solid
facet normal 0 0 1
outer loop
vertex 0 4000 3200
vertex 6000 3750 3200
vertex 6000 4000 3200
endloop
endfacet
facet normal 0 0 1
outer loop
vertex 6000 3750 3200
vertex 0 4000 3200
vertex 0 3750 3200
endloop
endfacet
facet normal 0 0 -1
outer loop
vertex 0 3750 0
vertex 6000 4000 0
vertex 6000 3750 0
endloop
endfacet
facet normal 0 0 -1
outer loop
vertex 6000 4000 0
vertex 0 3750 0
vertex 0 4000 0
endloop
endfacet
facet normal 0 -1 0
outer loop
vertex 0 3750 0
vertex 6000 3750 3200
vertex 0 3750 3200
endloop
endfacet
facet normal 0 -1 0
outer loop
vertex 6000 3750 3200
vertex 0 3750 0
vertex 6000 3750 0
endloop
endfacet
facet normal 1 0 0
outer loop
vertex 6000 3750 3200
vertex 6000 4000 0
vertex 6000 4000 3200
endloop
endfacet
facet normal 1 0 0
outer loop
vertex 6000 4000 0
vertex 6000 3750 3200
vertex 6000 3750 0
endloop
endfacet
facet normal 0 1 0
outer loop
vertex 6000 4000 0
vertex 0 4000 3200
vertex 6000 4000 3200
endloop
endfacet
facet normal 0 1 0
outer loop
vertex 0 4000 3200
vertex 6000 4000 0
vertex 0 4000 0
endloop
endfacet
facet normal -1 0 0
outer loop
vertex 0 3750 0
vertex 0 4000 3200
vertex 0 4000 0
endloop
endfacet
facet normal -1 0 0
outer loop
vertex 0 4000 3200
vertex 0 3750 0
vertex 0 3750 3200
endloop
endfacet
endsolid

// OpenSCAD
// file: tea_shop_parameters.scad
// =============================================================================
// Tea Shop — SHARED PARAMETERS (Base & Shell)
// -----------------------------------------------------------------------------
// OpenSCAD's native unit is 1 mm, so every value here is the REAL-LIFE size
// in millimetres (1000 mm = 1 m). E.g. building_width = 6000 means 6.0 m.
//
// For MLO / FiveM (which uses metres as 1 unit = 1 m), either:
//   (a) export each STL here and re-import at a scale of 0.001 (mm -> m), or
//   (b) model in metres directly by dividing every value below by 1000.
//
// Tune each value here; every module pulls its size from these variables.
// =============================================================================


// --- building shell / roof (lean-to: TALL back, SHORT front eave) -----------
wall_thickness    = 250;   // wall panel thickness                      (0.25 m)
building_width    = 6000;  // X extent, left wall -> right wall          (6.00 m)
building_depth    = 4000;  // Y extent, front eave -> back wall          (4.00 m)
back_height       = 3200;  // full wall height at the BACK (tall side)   (3.20 m)
front_eave_height = 2400;  // wall height at the FRONT eave (short side) (2.40 m)

// --- front wall openings (service window + door), measured along X ----------
left_pier_width   = 600;   // solid pier left of the service window      (0.60 m)
window_width      = 3400;  // service window opening width — made WIDE   (3.40 m)
mid_pier_width    = 500;   // solid pier between window and door         (0.50 m)
door_width        = 1000;  // door opening width                         (1.00 m)
sill_height       = 900;   // knee-wall (sill) height beneath the window (0.90 m)

// --- base slab / plinth ------------------------------------------------------
base_thickness    = 200;   // vertical thickness of the ground plinth    (0.20 m)
base_side_margin  = 900;   // slab overhang beyond left/right walls      (0.90 m)
base_back_margin  = 600;   // slab overhang behind the back wall         (0.60 m)
base_front_margin = 3000;  // extra slab in FRONT = porch/patio (pergola)(3.00 m)


// -----------------------------------------------------------------------------
// DERIVED DIMENSIONS (do not edit — computed from the values above)
// -----------------------------------------------------------------------------

// front-wall pier chain, left -> right, must sum exactly to building_width
window_left      = left_pier_width;                    // X where the window starts
window_right     = window_left + window_width;         // X where the window ends
door_left        = window_right + mid_pier_width;      // X where the door starts
door_right       = door_left + door_width;             // X where the door ends
right_pier_width = building_width - door_right;        // fills the rest to the corner

// window opening rises from the top of the sill up to the front eave line
window_open_height = front_eave_height - sill_height;
// file: tea_shop_modules.scad
// =============================================================================
// Tea Shop — MODULE LIBRARY (Base & Shell)
// -----------------------------------------------------------------------------
// This file only DEFINES the parts (and the assemble() preview). It instantiates
// NO geometry on its own, so it can be include'd by the individual export files
// (part_*.scad) and by tea_shop_assemble.scad without producing duplicates.
//
// GLOBAL COORDINATE SYSTEM (shared by every piece — no per-part centering):
//   +X -> left -> right  (building WIDTH along X, left wall at X=0)
//   +Y -> front -> back  (building DEPTH along Y, front eave at Y=0)
//   +Z -> up             (ground/porch surface = Z=0)
//
//   Building footprint = [0..building_width] x [0..building_depth].
//   Roof = single-pitch lean-to: TALL at BACK (Y=depth), SHORT at FRONT (Y=0).
// =============================================================================

include <tea_shop_parameters.scad>;


// -----------------------------------------------------------------------------
// _trapezoid_prism — shared core for the two side walls. It draws the side
// elevation (depth x height) as a 2D polygon, then linear_extrude +
// rotate([0,-90,0]) stand it up so its thickness runs along X. The front edge
// (Y=0) is the short eave height and the back edge (Y=depth) is the full back
// height, so the top edge automatically matches the roof pitch. Result
// occupies X = [0 .. wall_thickness].
// -----------------------------------------------------------------------------
module _trapezoid_prism() {
    translate([wall_thickness, 0, 0])
        rotate([0, -90, 0])
            linear_extrude(height = wall_thickness)
                polygon(points = [
                    [0,                 0],               // front, ground
                    [0,                 building_depth],  // back,  ground
                    [back_height,       building_depth],  // back,  top (tall)
                    [front_eave_height, 0]                // front, top (eave)
                ]);
}


// =============================================================================
// base_slab — flat ground plinth. Extends past the building on all sides, with
// a generous margin up front to form the porch/patio where the bench / stools
// sit under the pergola. Top surface is the datum Z=0.
// =============================================================================
module base_slab() {
    translate([-base_side_margin, -base_front_margin, -base_thickness])
        cube([
            building_width + 2 * base_side_margin,                 // X
            building_depth + base_front_margin + base_back_margin, // Y
            base_thickness                                          // Z
        ]);
}


// =============================================================================
// back_wall — solid rectangular panel, full building width and FULL height
// (the tall side of the lean-to). Sits at the back edge of the footprint.
// =============================================================================
module back_wall() {
    translate([0, building_depth - wall_thickness, 0])
        cube([building_width, wall_thickness, back_height]);
}


// =============================================================================
// left_side_wall — trapezoidal panel, TALL at the back edge and SHORT at the
// front edge, matching the roof slope. Occupies X = [0 .. wall_thickness].
// =============================================================================
module left_side_wall() {
    _trapezoid_prism();
}


// =============================================================================
// right_side_wall — mirror image of the left wall (identical trapezoid cross
// section, since both walls slope down toward the FRONT eave), placed at the
// right edge X = [building_width - wall_thickness .. building_width].
// Plain — no openings.
// =============================================================================
module right_side_wall() {
    translate([building_width - wall_thickness, 0, 0])
        _trapezoid_prism();
}


// =============================================================================
// FRONT WALL — broken into solid piers + a knee-wall (sill), leaving a service
// window opening and a door opening. Every front piece tops out at the front
// eave height (the horizontal line where the roof meets the front wall).
//
//   |<- left ->|<--- window --->|<- mid ->|<-- door -->|<- right ->|
//   |   pier   |    (opening)   |   pier  |  (opening)  |   pier   |
//   |          |   [sill below] |         |             |          |
// =============================================================================

// front_wall_left_pier — solid pier left of the service window, ground to eave.
module front_wall_left_pier() {
    translate([0, 0, 0])
        cube([left_pier_width, wall_thickness, front_eave_height]);
}


// front_wall_sill — the low knee-wall beneath the service window opening.
// The window opening sits above it.
// TODO: counter + window frame modules slot in above this sill (later group).
module front_wall_sill() {
    translate([window_left, 0, 0])
        cube([window_width, wall_thickness, sill_height]);
}


// front_wall_mid_pier — solid pier between the window and the door, full height.
module front_wall_mid_pier() {
    translate([window_right, 0, 0])
        cube([mid_pier_width, wall_thickness, front_eave_height]);
}


// front_wall_right_pier — solid pier right of the door, out to the front corner.
// Width is derived so the pier chain always ends flush with the right corner.
module front_wall_right_pier() {
    translate([door_right, 0, 0])
        cube([right_pier_width, wall_thickness, front_eave_height]);
}


// -----------------------------------------------------------------------------
// OPENING ANNOTATIONS (for reference — these are EMPTY volumes in the shell):
//
//   Service window opening:
//     X = [window_left .. window_right], Z = [sill_height .. front_eave_height]
//     TODO: window frame + service counter modules slot in here (later group).
//
//   Door opening:
//     X = [door_left .. door_right], Z = [0 .. front_eave_height] (full height)
//     TODO: door / door-frame module slots in here (later group).
// -----------------------------------------------------------------------------


// =============================================================================
// assemble — visual verification ONLY (not for export). Shows every piece in
// the shared coordinate system, each in its own colour, so the assembled shell
// can be checked against the reference before exporting individual STLs.
// =============================================================================
module assemble() {
    color("LightGray")  base_slab();

    color("SkyBlue")    back_wall();
    color("Orange")     left_side_wall();
    color("Orange")     right_side_wall();

    color("FireBrick")  front_wall_left_pier();
    color("Peru")       front_wall_sill();
    color("FireBrick")  front_wall_mid_pier();
    color("FireBrick")  front_wall_right_pier();
}
// main file
// =============================================================================
// part_back_wall.scad — export the BACK WALL only.
// Open this file, press F6 (render), then export as STL. Everything sits in the
// shared global coordinate system, so re-importing all parts together lines up
// automatically with no manual repositioning.
// =============================================================================

include <tea_shop_modules.scad>;

back_wall();
